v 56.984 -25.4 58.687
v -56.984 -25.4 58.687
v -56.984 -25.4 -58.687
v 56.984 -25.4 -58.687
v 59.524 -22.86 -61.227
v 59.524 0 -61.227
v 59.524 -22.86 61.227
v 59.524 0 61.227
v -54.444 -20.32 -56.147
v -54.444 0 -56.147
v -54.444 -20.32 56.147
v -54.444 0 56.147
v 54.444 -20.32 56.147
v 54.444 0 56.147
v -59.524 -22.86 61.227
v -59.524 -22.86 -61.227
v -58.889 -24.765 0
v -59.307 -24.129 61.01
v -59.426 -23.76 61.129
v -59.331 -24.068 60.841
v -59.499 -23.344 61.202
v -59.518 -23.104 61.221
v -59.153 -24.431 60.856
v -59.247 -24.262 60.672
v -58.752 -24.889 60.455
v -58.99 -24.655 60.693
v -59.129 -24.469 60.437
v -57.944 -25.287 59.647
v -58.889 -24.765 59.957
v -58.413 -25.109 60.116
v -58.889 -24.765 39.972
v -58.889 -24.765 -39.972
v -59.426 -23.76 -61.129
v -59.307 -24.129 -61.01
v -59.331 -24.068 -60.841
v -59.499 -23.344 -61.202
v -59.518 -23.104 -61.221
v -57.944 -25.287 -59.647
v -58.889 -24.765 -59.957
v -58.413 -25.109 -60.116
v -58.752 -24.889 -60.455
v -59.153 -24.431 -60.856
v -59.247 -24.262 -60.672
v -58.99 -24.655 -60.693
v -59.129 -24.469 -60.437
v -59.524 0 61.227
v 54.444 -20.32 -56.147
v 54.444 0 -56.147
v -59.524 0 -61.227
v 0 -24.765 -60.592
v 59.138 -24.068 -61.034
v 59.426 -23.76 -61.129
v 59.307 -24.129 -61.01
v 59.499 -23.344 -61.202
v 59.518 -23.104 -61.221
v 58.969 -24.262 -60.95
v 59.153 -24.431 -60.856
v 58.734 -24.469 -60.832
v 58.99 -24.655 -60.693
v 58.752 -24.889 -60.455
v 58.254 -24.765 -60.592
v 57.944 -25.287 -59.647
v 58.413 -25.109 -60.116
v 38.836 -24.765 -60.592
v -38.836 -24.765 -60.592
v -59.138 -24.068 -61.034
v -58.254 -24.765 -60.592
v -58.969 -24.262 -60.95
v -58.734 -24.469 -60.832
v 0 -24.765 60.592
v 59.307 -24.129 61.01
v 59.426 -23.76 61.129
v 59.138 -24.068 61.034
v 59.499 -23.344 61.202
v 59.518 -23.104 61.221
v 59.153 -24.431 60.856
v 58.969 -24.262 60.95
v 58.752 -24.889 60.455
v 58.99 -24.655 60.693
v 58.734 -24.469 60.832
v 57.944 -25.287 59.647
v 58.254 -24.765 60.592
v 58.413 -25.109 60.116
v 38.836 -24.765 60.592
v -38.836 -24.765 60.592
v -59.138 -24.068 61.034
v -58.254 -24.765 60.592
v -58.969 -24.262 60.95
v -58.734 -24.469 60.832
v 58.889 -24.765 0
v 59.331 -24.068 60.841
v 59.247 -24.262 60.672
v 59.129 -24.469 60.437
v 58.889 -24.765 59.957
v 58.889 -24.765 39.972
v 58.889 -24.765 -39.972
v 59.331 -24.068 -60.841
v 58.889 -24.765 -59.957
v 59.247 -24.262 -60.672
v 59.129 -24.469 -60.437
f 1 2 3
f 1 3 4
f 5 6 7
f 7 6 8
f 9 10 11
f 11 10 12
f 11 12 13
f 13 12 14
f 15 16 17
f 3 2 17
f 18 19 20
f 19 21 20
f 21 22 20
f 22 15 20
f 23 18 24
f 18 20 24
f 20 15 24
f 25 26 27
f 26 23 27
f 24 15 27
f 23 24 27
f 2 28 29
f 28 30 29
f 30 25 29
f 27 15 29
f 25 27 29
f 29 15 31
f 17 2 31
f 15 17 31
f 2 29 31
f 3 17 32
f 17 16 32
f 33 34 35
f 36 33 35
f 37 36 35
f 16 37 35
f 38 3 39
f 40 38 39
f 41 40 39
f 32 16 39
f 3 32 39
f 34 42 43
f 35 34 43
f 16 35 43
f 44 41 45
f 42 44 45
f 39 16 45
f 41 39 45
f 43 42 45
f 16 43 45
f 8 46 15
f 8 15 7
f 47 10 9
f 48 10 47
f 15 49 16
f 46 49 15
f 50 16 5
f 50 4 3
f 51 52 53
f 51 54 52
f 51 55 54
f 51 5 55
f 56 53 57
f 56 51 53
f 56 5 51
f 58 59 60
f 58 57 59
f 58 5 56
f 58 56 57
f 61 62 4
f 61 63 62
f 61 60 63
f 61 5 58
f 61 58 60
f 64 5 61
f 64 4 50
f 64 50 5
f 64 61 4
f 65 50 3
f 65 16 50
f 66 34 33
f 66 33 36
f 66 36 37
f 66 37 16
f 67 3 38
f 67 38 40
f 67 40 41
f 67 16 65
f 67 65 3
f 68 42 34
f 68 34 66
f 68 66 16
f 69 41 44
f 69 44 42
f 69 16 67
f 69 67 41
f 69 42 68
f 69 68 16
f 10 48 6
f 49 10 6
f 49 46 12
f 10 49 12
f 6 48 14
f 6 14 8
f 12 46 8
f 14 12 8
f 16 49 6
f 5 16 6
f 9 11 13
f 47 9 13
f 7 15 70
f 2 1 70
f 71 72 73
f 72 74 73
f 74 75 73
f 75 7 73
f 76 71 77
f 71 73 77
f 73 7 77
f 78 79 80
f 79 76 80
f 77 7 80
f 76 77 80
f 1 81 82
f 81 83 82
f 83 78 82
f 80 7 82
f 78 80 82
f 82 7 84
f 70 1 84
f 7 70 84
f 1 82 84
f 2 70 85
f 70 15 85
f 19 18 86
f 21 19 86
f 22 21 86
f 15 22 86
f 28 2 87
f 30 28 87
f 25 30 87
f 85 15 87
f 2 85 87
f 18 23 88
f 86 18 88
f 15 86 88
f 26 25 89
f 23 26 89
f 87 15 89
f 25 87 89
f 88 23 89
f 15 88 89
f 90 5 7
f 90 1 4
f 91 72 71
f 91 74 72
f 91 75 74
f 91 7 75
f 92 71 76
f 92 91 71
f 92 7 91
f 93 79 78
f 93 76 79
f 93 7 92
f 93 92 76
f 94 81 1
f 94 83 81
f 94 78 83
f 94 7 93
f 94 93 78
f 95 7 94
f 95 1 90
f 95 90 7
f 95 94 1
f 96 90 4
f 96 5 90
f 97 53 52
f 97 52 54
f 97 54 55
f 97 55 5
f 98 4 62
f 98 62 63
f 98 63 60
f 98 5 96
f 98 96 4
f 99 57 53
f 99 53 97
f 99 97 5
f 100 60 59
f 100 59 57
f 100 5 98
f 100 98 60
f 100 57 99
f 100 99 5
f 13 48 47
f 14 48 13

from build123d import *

# Parameters (mm, degrees)
F0_W        = 119.0486699343
F0_H        = 122.4547103047
F1_DEPTH    = 25.4
F2_T1_DEPTH = 131.7486699343
F2_T3_DEPTH = 135.1547103047
F3_T        = -5.08


# Not quite as in the source:
# - a fillet or chamfer that OpenCascade refuses, or shapes differently, is made with other operations: its cross-section is extruded or revolved along the edge and cut away or added


with BuildPart() as f1:
    # F0 (on Front) → F1 (new body)
    with BuildSketch(Plane.XZ):
        Rectangle(F0_W, F0_H)
    extrude(amount=F1_DEPTH)

    # F2: fillet of radius 2.54 on 4 edges, made by hand

    # F2_s2 → F2_t1 (cut)
    with BuildSketch(Plane.YZ.offset(-65.8743349671)):
        with BuildLine():
            add(Edge.make_bspline(
                [(-22.86, 61.2273551524), (-25.4, 61.2273551524), (-25.4, 58.6873551524)],
                knots=[0, 0, 0, 1, 1, 1], degree=2, weights=[1, 1, 1]))
            Line((-25.4, 58.6873551524), (-25.4, 61.2273551524))
            Line((-25.4, 61.2273551524), (-22.86, 61.2273551524))
        make_face()
        with BuildLine():
            add(Edge.make_bspline(
                [(-22.86, -61.2273551524), (-25.4, -61.2273551524), (-25.4, -58.6873551524)],
                knots=[0, 0, 0, 1, 1, 1], degree=2, weights=[1, 1, 1]))
            Line((-25.4, -58.6873551524), (-25.4, -61.2273551524))
            Line((-25.4, -61.2273551524), (-22.86, -61.2273551524))
        make_face()
    extrude(amount=F2_T1_DEPTH, mode=Mode.SUBTRACT)

    # F2_s4 → F2_t3 (cut)
    with BuildSketch(Plane.XY.offset(-67.5773551524)):
        with BuildLine():
            add(Edge.make_bspline(
                [(-59.5243349671, -22.86), (-59.5243349671, -25.4), (-56.9843349671, -25.4)],
                knots=[0, 0, 0, 1, 1, 1], degree=2, weights=[1, 1, 1]))
            Line((-56.9843349671, -25.4), (-59.5243349671, -25.4))
            Line((-59.5243349671, -25.4), (-59.5243349671, -22.86))
        make_face()
        with BuildLine():
            add(Edge.make_bspline(
                [(59.5243349671, -22.86), (59.5243349671, -25.4), (56.9843349671, -25.4)],
                knots=[0, 0, 0, 1, 1, 1], degree=2, weights=[1, 1, 1]))
            Line((56.9843349671, -25.4), (59.5243349671, -25.4))
            Line((59.5243349671, -25.4), (59.5243349671, -22.86))
        make_face()
    extrude(amount=F2_T3_DEPTH, mode=Mode.SUBTRACT)

    # F3
    f3_openings = [f1.faces().sort_by_distance(p)[0] for p in [
        (0, 0, 0),
    ]]
    offset(amount=F3_T, openings=f3_openings)


solid = f1.part
